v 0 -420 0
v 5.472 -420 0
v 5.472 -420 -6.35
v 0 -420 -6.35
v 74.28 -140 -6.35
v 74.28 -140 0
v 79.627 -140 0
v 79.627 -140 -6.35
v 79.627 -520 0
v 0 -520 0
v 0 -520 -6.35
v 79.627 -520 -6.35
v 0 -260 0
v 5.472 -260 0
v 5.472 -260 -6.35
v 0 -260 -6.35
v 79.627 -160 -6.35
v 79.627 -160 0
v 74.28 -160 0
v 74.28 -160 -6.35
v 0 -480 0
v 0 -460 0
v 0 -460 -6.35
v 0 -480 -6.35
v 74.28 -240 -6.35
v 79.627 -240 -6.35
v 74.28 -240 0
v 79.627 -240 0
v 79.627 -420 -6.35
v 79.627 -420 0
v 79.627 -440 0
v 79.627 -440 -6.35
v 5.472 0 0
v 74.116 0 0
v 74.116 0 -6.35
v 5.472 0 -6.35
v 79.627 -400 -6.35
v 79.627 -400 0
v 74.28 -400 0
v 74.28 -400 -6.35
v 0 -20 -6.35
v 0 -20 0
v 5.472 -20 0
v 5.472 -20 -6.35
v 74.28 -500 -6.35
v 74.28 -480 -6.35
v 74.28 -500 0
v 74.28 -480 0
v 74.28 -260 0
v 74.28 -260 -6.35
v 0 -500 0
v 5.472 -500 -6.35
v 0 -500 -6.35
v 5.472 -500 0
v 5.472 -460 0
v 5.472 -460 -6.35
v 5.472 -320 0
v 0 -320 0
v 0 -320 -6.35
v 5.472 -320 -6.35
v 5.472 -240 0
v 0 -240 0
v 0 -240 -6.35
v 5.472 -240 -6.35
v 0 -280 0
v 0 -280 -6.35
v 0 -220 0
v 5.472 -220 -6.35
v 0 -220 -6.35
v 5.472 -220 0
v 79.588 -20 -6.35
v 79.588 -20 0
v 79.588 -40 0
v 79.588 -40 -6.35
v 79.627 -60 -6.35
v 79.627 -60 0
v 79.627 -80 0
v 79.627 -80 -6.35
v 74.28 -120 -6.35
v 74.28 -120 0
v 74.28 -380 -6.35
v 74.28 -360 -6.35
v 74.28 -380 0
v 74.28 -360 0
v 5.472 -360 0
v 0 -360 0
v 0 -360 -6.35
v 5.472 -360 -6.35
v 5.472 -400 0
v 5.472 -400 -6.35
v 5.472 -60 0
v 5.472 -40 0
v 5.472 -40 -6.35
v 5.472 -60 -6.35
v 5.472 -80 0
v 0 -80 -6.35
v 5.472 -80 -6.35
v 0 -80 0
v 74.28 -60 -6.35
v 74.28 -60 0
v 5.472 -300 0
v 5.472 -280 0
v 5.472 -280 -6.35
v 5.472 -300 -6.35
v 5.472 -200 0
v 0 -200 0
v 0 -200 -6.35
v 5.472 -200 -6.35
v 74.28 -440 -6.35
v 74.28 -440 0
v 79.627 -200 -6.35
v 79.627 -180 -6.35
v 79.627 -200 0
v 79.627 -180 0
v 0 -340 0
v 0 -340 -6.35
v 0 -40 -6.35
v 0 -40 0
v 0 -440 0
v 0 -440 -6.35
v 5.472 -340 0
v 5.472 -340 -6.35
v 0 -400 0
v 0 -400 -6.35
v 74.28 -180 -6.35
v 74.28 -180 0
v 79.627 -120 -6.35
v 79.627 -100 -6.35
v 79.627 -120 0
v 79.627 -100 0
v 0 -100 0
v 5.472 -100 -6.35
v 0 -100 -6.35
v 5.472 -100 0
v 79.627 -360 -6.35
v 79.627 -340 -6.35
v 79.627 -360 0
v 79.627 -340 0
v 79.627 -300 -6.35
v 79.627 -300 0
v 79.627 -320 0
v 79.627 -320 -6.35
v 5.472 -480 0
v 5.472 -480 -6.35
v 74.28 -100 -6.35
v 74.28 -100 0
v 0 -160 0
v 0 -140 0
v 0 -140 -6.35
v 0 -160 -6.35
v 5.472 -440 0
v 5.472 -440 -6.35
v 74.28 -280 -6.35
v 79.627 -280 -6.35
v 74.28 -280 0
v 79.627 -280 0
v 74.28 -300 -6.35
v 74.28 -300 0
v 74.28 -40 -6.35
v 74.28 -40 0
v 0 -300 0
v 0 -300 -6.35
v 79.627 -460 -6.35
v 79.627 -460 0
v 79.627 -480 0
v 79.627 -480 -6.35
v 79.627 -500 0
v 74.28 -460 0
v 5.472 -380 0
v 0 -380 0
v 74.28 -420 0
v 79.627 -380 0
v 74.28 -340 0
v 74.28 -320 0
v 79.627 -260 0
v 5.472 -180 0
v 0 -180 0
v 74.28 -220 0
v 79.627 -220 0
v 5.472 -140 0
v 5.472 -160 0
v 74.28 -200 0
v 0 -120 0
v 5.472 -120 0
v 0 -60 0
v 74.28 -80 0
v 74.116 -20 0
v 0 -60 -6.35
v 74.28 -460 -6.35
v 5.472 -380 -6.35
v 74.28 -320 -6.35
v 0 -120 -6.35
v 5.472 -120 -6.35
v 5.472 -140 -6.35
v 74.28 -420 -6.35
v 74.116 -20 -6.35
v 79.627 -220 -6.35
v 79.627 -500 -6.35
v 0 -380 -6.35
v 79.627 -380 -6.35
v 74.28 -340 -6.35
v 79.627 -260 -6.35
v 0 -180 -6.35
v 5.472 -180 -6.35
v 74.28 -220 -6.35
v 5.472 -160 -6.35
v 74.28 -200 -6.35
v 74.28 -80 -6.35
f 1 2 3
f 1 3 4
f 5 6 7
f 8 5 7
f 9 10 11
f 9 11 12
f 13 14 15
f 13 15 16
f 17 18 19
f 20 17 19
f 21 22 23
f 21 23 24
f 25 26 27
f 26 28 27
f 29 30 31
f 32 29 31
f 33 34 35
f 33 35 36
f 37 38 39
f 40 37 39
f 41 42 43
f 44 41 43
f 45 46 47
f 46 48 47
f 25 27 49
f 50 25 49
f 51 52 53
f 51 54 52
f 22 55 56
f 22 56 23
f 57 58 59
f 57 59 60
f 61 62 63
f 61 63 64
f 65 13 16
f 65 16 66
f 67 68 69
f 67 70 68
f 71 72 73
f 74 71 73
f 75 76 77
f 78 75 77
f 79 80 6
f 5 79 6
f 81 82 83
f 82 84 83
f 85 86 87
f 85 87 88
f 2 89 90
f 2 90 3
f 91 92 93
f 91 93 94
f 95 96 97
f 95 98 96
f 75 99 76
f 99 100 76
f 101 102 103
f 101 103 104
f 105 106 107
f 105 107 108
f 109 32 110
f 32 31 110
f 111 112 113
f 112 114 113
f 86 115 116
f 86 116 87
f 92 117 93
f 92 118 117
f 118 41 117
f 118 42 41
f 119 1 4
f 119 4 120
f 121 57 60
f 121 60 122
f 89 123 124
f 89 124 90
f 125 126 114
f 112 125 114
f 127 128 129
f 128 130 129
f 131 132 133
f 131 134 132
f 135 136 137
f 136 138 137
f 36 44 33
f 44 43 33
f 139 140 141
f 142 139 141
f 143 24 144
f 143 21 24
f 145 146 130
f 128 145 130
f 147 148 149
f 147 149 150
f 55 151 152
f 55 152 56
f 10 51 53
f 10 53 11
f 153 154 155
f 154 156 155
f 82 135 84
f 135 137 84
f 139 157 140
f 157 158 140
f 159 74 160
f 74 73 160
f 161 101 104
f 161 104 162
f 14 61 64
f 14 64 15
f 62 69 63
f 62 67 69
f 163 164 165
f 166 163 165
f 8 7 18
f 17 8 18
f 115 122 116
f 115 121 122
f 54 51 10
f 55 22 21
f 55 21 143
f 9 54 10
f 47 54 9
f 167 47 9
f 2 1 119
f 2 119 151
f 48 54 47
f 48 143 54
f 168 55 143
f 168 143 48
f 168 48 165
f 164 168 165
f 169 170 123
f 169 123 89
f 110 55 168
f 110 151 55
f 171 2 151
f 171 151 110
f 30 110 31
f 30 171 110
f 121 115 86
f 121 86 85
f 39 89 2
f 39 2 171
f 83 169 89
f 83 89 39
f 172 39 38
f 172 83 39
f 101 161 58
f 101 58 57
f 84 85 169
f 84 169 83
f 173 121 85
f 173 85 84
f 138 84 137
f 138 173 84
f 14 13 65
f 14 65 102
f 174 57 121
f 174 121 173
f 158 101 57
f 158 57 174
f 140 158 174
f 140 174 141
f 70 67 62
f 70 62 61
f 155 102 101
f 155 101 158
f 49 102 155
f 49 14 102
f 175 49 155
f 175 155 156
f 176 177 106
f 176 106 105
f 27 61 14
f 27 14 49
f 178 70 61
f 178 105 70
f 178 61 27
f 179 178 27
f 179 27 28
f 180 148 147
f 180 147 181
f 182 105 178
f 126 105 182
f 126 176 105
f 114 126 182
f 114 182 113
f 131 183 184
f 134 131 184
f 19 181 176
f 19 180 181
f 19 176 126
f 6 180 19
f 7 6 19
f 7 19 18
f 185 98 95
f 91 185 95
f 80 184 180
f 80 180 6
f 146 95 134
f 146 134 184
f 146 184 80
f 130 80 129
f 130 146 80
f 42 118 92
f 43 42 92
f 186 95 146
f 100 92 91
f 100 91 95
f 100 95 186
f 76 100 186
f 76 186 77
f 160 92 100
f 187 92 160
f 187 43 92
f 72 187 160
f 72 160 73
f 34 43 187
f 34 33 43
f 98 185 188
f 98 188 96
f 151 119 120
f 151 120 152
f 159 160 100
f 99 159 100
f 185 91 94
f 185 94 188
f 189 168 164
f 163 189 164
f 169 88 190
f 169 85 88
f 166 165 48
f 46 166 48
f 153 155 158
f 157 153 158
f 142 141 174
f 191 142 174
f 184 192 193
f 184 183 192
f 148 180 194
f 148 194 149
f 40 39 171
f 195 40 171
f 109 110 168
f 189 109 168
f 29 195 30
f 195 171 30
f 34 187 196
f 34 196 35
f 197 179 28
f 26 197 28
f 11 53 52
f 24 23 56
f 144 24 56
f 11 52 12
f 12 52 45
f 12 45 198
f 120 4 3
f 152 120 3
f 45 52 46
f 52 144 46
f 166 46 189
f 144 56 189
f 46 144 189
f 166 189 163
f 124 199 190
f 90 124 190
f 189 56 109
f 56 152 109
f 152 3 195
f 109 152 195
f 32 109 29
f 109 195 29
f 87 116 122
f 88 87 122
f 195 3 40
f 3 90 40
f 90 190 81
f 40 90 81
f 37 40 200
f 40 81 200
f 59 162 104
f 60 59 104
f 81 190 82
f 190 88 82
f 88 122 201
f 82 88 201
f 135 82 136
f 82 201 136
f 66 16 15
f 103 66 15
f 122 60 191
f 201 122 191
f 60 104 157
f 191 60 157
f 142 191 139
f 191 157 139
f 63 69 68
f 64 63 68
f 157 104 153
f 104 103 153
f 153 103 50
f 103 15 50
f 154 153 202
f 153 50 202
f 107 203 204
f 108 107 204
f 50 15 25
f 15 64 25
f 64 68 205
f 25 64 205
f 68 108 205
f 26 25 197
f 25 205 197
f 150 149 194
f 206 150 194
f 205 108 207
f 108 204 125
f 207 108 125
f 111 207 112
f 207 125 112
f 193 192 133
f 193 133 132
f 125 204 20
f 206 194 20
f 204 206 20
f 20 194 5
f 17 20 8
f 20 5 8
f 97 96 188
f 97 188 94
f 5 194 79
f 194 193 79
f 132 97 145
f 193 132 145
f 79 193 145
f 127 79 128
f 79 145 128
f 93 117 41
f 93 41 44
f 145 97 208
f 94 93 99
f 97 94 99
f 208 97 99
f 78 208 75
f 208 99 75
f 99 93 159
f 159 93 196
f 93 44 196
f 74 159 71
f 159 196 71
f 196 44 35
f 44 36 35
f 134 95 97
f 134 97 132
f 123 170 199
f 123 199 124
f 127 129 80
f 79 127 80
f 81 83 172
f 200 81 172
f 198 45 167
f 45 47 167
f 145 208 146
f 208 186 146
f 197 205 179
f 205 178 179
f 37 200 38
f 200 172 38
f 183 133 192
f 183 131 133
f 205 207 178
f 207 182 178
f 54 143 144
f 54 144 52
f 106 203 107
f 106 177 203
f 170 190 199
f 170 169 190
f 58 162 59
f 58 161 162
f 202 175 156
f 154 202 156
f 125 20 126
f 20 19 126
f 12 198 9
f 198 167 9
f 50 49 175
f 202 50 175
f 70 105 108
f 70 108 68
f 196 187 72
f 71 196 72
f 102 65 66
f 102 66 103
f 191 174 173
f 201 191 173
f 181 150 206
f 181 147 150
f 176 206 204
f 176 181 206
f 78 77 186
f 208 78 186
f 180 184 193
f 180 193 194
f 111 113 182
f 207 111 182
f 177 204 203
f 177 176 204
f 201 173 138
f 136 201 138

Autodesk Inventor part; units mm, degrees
ref_plane "YZ Plane" through (0, 0, 0) normal (1, 0, 0) x (0, 1, 0)
ref_plane "XZ Plane" through (0, 0, 0) normal (0, 1, 0) x (-1, 0, 0)
ref_plane "XY Plane" through (0, 0, 0) normal (0, 0, 1) x (1, 0, 0)
sketch "Sketch1" plane through (0, 0, 0) normal (0, 0, 1) x (1, 0, 0)
  line L0 (0, 0) -> (0, 20)
  line L1 (79.3918, 0) -> (79.3918, 20) projected
  line L2 (79.3918, 0) -> (0, 0) projected
  line L3 (-0.2277, -520) -> (79.6269, -520) projected
  line L4 (5.4724, 0) -> (74.116, 0)
  line L5 (79.6269, -520) -> (0, -520)
  line L6 (74.116, -20) -> (74.116, 0) projected
  line L7 (74.116, 0) -> (74.116, -20)
  line L8 (74.116, -20) -> (79.5884, -20)
  line L9 (0, -20) -> (5.4724, -20)
  line L10 (5.4724, -20) -> (5.4724, 0)
  line L11 (39.7942, 0) -> (39.7942, -37.2544) construction
  line L12 (0, -20) -> (0, -40)
  line L13 (0, -40) -> (5.4724, -40)
  line L14 (79.5884, -20) -> (79.5884, -40)
  line L15 (79.5884, -40) -> (74.28, -40)
  line L16 (5.4724, -40) -> (5.4724, -60)
  line L17 (5.4724, -60) -> (0, -60)
  line L18 (0, -60) -> (0, -80)
  line L19 (0, -80) -> (5.4724, -80)
  line L20 (5.4724, -80) -> (5.4724, -100)
  line L21 (5.4724, -100) -> (0, -100)
  line L22 (0, -100) -> (0, -120)
  line L23 (0, -120) -> (5.4724, -120)
  line L24 (5.4724, -120) -> (5.4724, -140)
  line L25 (5.4724, -140) -> (0, -140)
  line L26 (0, -140) -> (0, -160)
  line L27 (0, -160) -> (5.4724, -160)
  line L28 (5.4724, -160) -> (5.4724, -180)
  line L29 (5.4724, -180) -> (0, -180)
  line L30 (0, -180) -> (0, -200)
  line L31 (0, -200) -> (5.4724, -200)
  line L32 (5.4724, -200) -> (5.4724, -220)
  line L33 (5.4724, -220) -> (0, -220)
  line L34 (0, -220) -> (0, -240)
  line L35 (0, -240) -> (5.4724, -240)
  line L36 (5.4724, -240) -> (5.4724, -260)
  line L37 (5.4724, -260) -> (0, -260)
  line L38 (0, -260) -> (0, -280)
  line L39 (0, -280) -> (5.4724, -280)
  line L40 (5.4724, -280) -> (5.4724, -300)
  line L41 (5.4724, -300) -> (0, -300)
  line L42 (0, -300) -> (0, -320)
  line L43 (0, -320) -> (5.4724, -320)
  line L44 (5.4724, -320) -> (5.4724, -340)
  line L45 (5.4724, -340) -> (0, -340)
  line L46 (0, -340) -> (0, -360)
  line L47 (0, -360) -> (5.4724, -360)
  line L48 (5.4724, -360) -> (5.4724, -380)
  line L49 (5.4724, -380) -> (0, -380)
  line L50 (0, -380) -> (0, -400)
  line L51 (0, -400) -> (5.4724, -400)
  line L52 (5.4724, -400) -> (5.4724, -420)
  line L53 (5.4724, -420) -> (0, -420)
  line L54 (0, -420) -> (0, -440)
  line L55 (0, -440) -> (5.4724, -440)
  line L56 (5.4724, -440) -> (5.4724, -460)
  line L57 (5.4724, -460) -> (0, -460)
  line L58 (0, -460) -> (0, -480)
  line L59 (0, -480) -> (5.4724, -480)
  line L60 (5.4724, -480) -> (5.4724, -500)
  line L61 (5.4724, -500) -> (0, -500)
  line L62 (0, -500) -> (0, -520)
  line L63 (74.28, -40) -> (74.28, -60)
  line L64 (74.28, -60) -> (79.6269, -60)
  line L65 (79.6269, -60) -> (79.6269, -80)
  line L66 (79.6269, -80) -> (74.28, -80)
  line L67 (74.28, -80) -> (74.28, -100)
  line L68 (74.28, -100) -> (79.6269, -100)
  line L69 (79.6269, -100) -> (79.6269, -120)
  line L70 (79.6269, -120) -> (74.28, -120)
  line L71 (74.28, -120) -> (74.28, -140)
  line L72 (74.28, -140) -> (79.6269, -140)
  line L73 (79.6269, -140) -> (79.6269, -160)
  line L74 (79.6269, -160) -> (74.28, -160)
  line L75 (74.28, -160) -> (74.28, -180)
  line L76 (74.28, -180) -> (79.6269, -180)
  line L77 (79.6269, -180) -> (79.6269, -200)
  line L78 (79.6269, -200) -> (74.28, -200)
  line L79 (74.28, -200) -> (74.28, -220)
  line L80 (74.28, -220) -> (79.6269, -220)
  line L81 (79.6269, -220) -> (79.6269, -240)
  line L82 (79.6269, -240) -> (74.28, -240)
  line L83 (74.28, -240) -> (74.28, -260)
  line L84 (74.28, -260) -> (79.6269, -260)
  line L85 (79.6269, -260) -> (79.6269, -280)
  line L86 (79.6269, -280) -> (74.28, -280)
  line L87 (74.28, -280) -> (74.28, -300)
  line L88 (74.28, -300) -> (79.6269, -300)
  line L89 (79.6269, -300) -> (79.6269, -320)
  line L90 (79.6269, -320) -> (74.28, -320)
  line L91 (74.28, -320) -> (74.28, -340)
  line L92 (74.28, -340) -> (79.6269, -340)
  line L93 (79.6269, -340) -> (79.6269, -360)
  line L94 (79.6269, -360) -> (74.28, -360)
  line L95 (74.28, -360) -> (74.28, -380)
  line L96 (74.28, -380) -> (79.6269, -380)
  line L97 (79.6269, -380) -> (79.6269, -400)
  line L98 (79.6269, -400) -> (74.28, -400)
  line L99 (74.28, -400) -> (74.28, -420)
  line L100 (74.28, -420) -> (79.6269, -420)
  line L101 (79.6269, -420) -> (79.6269, -440)
  line L102 (79.6269, -440) -> (74.28, -440)
  line L103 (74.28, -440) -> (74.28, -460)
  line L104 (74.28, -460) -> (79.6269, -460)
  line L105 (79.6269, -460) -> (79.6269, -480)
  line L106 (79.6269, -480) -> (74.28, -480)
  line L107 (74.28, -480) -> (74.28, -500)
  line L108 (74.28, -500) -> (79.6269, -500)
  line L109 (79.6269, -500) -> (79.6269, -520)
  dimension "d16" = 20
  dimension "d17" = 20
  dimension "d18" = 20
  dimension "d19" = 20
  dimension "d20" = 20
  dimension "d21" = 20
  dimension "d22" = 20
  dimension "d23" = 20
  dimension "d24" = 20
  dimension "d25" = 20
  dimension "d26" = 20
  dimension "d27" = 20
  dimension "d28" = 20
  dimension "d29" = 20
  dimension "d30" = 20
  dimension "d31" = 20
  dimension "d32" = 20
  dimension "d33" = 20
  dimension "d34" = 20
  dimension "d35" = 20
  dimension "d36" = 20
  dimension "d37" = 20
  dimension "d38" = 20
  dimension "d39" = 20
extrude "Extrusion1" add sketch "Sketch1" against normal blind 6.35
properties part number "small wall"
